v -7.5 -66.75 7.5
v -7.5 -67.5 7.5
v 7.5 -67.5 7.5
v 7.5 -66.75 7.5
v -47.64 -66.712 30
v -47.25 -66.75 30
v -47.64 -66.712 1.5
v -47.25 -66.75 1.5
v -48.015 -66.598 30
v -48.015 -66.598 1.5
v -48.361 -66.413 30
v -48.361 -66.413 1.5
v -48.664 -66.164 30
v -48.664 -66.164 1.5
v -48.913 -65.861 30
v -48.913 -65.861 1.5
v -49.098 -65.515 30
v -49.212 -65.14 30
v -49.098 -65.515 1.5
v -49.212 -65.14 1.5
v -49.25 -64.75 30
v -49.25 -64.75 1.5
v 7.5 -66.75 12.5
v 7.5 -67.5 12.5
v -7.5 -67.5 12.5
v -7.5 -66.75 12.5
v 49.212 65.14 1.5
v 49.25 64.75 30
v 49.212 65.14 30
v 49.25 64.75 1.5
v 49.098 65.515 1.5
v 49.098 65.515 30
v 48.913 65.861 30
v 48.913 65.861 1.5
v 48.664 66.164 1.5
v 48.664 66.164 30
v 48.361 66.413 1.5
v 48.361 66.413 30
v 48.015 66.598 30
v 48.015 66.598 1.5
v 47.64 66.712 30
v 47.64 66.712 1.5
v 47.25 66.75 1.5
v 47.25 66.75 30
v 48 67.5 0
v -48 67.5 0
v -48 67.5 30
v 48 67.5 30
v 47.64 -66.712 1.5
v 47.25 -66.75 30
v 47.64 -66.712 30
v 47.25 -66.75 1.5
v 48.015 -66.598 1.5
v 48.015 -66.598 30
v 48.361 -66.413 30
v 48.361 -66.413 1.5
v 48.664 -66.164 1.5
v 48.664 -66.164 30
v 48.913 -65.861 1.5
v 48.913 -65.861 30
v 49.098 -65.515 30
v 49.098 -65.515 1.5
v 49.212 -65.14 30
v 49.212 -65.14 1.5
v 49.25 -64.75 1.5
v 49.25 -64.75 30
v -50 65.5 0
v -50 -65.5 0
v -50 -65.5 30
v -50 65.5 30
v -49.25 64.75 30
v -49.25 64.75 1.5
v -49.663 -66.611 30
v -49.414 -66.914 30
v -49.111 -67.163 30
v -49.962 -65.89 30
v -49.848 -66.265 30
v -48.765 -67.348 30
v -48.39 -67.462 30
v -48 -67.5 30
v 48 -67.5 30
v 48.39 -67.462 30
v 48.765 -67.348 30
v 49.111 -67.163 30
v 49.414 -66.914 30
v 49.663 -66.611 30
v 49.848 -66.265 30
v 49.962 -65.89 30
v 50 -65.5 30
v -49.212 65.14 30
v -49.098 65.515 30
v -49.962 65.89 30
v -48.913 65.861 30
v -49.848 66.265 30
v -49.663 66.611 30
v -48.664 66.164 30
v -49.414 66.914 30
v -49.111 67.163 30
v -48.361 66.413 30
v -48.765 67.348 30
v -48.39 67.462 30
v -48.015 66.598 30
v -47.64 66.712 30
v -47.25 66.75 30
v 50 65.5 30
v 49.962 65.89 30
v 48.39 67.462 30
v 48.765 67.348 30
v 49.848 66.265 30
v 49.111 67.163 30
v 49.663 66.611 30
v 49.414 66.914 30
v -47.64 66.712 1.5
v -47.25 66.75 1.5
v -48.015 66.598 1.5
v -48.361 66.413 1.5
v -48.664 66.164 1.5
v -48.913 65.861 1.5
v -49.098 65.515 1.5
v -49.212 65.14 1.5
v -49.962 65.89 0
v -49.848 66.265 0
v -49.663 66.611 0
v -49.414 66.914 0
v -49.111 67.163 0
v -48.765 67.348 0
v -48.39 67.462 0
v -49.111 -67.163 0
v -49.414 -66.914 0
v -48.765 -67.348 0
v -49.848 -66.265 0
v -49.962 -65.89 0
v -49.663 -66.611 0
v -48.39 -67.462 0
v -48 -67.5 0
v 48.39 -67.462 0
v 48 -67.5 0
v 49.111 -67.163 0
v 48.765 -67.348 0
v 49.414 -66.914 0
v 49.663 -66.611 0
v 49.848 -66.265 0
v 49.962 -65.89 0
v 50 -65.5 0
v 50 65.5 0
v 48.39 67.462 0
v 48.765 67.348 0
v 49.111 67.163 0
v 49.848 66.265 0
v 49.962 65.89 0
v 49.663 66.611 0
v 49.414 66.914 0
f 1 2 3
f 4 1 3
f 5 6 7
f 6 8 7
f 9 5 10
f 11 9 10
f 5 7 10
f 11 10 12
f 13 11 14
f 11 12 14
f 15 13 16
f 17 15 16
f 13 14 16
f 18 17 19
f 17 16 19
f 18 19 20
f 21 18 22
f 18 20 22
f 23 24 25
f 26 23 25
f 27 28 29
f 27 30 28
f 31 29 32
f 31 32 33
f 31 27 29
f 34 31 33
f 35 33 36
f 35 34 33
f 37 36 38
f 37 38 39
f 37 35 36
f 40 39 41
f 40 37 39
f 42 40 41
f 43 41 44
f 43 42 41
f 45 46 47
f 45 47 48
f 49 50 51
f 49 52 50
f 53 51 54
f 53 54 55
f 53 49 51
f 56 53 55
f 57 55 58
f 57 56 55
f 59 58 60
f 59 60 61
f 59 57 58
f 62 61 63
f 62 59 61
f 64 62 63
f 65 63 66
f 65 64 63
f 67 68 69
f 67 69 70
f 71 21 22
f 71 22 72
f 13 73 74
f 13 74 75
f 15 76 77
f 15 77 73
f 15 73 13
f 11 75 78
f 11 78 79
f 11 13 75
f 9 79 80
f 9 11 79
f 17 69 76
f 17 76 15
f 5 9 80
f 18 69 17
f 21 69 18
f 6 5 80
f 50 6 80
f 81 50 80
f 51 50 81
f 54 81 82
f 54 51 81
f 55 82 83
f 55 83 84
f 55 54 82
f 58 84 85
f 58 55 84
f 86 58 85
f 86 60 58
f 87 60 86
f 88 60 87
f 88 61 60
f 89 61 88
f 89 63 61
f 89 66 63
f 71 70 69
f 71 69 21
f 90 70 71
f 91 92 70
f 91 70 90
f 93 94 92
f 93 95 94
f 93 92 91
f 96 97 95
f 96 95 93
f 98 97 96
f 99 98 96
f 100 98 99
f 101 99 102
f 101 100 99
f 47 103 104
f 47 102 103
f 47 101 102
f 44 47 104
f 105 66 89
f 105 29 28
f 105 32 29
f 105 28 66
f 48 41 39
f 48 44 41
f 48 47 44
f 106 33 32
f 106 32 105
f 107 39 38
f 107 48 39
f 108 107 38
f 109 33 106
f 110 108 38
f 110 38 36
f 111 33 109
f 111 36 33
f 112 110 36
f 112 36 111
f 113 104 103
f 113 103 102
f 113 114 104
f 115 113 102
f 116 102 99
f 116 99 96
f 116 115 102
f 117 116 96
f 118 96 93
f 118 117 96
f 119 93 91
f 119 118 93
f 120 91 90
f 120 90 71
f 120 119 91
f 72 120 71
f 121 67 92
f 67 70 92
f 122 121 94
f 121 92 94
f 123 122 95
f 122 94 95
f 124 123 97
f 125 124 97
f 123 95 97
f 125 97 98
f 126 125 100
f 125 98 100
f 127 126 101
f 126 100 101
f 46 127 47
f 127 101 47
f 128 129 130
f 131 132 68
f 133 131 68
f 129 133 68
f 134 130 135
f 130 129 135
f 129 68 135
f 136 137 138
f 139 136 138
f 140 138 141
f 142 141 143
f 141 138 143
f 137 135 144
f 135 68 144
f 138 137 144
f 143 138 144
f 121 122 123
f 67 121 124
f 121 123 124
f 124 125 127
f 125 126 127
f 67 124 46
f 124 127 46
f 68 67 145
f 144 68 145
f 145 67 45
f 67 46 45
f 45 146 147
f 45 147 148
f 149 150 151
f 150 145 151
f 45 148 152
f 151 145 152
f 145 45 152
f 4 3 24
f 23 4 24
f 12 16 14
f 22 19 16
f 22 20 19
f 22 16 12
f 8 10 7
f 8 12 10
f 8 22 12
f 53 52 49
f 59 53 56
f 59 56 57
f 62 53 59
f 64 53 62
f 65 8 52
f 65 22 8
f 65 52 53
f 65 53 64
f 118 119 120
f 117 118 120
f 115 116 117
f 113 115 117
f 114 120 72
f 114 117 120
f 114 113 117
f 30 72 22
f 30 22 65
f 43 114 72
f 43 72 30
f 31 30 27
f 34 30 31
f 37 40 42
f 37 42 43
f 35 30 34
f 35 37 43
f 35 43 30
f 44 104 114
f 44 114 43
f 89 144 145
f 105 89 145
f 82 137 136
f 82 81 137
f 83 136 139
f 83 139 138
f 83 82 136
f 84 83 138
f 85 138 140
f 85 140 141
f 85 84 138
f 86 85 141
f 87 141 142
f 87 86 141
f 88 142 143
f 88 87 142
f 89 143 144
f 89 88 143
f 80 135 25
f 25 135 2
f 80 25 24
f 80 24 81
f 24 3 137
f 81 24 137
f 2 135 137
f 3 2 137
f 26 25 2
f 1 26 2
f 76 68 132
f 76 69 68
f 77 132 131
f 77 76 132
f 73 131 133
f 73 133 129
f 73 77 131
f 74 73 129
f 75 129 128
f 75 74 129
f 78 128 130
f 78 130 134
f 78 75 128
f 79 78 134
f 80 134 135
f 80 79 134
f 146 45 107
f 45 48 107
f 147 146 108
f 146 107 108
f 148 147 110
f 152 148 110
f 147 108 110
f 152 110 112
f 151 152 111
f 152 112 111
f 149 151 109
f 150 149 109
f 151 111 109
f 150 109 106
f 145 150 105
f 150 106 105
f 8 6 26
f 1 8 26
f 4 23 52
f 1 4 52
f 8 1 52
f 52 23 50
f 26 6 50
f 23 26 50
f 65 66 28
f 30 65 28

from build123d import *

# Parameters (mm, degrees)
SKETCH1_W           = 100
SKETCH1_H           = 135
BOSS_EXTRUDE1_DEPTH = 30
SKETCH2_W           = 98.5
SKETCH2_H           = 133.5
CUT_EXTRUDE1_DEPTH  = 28.5
FILLET21_R          = 2
FILLET22_R          = 2
CUT_EXTRUDE2_DEPTH  = 1.5


with BuildPart() as part:
    # Sketch1 → Boss-Extrude1 (new body)
    with BuildSketch(Plane.XY):
        Rectangle(SKETCH1_W, SKETCH1_H)
    extrude(amount=BOSS_EXTRUDE1_DEPTH)

    # Sketch2 → Cut-Extrude1 (cut)
    with BuildSketch(Plane.XY.offset(30)):
        Rectangle(SKETCH2_W, SKETCH2_H)
    extrude(amount=-CUT_EXTRUDE1_DEPTH, mode=Mode.SUBTRACT)

    # Fillet21
    fillet21_edges = [part.edges().sort_by_distance(p)[0] for p in [
        (50, -67.5, 15),
        (-50, -67.5, 15),
        (-50, 67.5, 15),
        (50, 67.5, 15),
    ]]
    fillet(fillet21_edges, radius=FILLET21_R)

    # Fillet22
    fillet22_edges = [part.edges().sort_by_distance(p)[0] for p in [
        (49.25, 66.75, 15.75),
        (49.25, -66.75, 15.75),
        (-49.25, -66.75, 15.75),
        (-49.25, 66.75, 15.75),
    ]]
    fillet(fillet22_edges, radius=FILLET22_R)

    # Sketch4 → Cut-Extrude2 (cut)
    with BuildSketch(Plane.XZ.offset(67.5)):
        Polygon((0, 10), (0, 7.5), (7.5, 7.5), (7.5, 12.5), (0, 12.5), align=None)
        Polygon((-7.5, 7.5), (0, 7.5), (0, 10), (0, 12.5), (-7.5, 12.5), align=None)
    extrude(amount=-CUT_EXTRUDE2_DEPTH, mode=Mode.SUBTRACT)


solid = part.part
